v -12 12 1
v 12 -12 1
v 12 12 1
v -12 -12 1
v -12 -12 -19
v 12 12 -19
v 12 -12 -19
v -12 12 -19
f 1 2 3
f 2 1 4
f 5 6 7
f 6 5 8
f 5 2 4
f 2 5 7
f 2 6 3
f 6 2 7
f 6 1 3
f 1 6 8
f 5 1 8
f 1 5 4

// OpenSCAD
// Generated by SolidPython 1.1.3 on 2024-12-14 22:48:22


translate(v = [-12, -12, -19]) {
	cube(size = [24, 24, 20]);
}
/***********************************************
*********      SolidPython code:      **********
************************************************
 
from solid import *

# ケースになる部分
body = translate([-12, -12, -19])(
    cube([24, 24, 20])
)

scad_render_to_file(body, '1_cube.scad')
 
 
************************************************/
